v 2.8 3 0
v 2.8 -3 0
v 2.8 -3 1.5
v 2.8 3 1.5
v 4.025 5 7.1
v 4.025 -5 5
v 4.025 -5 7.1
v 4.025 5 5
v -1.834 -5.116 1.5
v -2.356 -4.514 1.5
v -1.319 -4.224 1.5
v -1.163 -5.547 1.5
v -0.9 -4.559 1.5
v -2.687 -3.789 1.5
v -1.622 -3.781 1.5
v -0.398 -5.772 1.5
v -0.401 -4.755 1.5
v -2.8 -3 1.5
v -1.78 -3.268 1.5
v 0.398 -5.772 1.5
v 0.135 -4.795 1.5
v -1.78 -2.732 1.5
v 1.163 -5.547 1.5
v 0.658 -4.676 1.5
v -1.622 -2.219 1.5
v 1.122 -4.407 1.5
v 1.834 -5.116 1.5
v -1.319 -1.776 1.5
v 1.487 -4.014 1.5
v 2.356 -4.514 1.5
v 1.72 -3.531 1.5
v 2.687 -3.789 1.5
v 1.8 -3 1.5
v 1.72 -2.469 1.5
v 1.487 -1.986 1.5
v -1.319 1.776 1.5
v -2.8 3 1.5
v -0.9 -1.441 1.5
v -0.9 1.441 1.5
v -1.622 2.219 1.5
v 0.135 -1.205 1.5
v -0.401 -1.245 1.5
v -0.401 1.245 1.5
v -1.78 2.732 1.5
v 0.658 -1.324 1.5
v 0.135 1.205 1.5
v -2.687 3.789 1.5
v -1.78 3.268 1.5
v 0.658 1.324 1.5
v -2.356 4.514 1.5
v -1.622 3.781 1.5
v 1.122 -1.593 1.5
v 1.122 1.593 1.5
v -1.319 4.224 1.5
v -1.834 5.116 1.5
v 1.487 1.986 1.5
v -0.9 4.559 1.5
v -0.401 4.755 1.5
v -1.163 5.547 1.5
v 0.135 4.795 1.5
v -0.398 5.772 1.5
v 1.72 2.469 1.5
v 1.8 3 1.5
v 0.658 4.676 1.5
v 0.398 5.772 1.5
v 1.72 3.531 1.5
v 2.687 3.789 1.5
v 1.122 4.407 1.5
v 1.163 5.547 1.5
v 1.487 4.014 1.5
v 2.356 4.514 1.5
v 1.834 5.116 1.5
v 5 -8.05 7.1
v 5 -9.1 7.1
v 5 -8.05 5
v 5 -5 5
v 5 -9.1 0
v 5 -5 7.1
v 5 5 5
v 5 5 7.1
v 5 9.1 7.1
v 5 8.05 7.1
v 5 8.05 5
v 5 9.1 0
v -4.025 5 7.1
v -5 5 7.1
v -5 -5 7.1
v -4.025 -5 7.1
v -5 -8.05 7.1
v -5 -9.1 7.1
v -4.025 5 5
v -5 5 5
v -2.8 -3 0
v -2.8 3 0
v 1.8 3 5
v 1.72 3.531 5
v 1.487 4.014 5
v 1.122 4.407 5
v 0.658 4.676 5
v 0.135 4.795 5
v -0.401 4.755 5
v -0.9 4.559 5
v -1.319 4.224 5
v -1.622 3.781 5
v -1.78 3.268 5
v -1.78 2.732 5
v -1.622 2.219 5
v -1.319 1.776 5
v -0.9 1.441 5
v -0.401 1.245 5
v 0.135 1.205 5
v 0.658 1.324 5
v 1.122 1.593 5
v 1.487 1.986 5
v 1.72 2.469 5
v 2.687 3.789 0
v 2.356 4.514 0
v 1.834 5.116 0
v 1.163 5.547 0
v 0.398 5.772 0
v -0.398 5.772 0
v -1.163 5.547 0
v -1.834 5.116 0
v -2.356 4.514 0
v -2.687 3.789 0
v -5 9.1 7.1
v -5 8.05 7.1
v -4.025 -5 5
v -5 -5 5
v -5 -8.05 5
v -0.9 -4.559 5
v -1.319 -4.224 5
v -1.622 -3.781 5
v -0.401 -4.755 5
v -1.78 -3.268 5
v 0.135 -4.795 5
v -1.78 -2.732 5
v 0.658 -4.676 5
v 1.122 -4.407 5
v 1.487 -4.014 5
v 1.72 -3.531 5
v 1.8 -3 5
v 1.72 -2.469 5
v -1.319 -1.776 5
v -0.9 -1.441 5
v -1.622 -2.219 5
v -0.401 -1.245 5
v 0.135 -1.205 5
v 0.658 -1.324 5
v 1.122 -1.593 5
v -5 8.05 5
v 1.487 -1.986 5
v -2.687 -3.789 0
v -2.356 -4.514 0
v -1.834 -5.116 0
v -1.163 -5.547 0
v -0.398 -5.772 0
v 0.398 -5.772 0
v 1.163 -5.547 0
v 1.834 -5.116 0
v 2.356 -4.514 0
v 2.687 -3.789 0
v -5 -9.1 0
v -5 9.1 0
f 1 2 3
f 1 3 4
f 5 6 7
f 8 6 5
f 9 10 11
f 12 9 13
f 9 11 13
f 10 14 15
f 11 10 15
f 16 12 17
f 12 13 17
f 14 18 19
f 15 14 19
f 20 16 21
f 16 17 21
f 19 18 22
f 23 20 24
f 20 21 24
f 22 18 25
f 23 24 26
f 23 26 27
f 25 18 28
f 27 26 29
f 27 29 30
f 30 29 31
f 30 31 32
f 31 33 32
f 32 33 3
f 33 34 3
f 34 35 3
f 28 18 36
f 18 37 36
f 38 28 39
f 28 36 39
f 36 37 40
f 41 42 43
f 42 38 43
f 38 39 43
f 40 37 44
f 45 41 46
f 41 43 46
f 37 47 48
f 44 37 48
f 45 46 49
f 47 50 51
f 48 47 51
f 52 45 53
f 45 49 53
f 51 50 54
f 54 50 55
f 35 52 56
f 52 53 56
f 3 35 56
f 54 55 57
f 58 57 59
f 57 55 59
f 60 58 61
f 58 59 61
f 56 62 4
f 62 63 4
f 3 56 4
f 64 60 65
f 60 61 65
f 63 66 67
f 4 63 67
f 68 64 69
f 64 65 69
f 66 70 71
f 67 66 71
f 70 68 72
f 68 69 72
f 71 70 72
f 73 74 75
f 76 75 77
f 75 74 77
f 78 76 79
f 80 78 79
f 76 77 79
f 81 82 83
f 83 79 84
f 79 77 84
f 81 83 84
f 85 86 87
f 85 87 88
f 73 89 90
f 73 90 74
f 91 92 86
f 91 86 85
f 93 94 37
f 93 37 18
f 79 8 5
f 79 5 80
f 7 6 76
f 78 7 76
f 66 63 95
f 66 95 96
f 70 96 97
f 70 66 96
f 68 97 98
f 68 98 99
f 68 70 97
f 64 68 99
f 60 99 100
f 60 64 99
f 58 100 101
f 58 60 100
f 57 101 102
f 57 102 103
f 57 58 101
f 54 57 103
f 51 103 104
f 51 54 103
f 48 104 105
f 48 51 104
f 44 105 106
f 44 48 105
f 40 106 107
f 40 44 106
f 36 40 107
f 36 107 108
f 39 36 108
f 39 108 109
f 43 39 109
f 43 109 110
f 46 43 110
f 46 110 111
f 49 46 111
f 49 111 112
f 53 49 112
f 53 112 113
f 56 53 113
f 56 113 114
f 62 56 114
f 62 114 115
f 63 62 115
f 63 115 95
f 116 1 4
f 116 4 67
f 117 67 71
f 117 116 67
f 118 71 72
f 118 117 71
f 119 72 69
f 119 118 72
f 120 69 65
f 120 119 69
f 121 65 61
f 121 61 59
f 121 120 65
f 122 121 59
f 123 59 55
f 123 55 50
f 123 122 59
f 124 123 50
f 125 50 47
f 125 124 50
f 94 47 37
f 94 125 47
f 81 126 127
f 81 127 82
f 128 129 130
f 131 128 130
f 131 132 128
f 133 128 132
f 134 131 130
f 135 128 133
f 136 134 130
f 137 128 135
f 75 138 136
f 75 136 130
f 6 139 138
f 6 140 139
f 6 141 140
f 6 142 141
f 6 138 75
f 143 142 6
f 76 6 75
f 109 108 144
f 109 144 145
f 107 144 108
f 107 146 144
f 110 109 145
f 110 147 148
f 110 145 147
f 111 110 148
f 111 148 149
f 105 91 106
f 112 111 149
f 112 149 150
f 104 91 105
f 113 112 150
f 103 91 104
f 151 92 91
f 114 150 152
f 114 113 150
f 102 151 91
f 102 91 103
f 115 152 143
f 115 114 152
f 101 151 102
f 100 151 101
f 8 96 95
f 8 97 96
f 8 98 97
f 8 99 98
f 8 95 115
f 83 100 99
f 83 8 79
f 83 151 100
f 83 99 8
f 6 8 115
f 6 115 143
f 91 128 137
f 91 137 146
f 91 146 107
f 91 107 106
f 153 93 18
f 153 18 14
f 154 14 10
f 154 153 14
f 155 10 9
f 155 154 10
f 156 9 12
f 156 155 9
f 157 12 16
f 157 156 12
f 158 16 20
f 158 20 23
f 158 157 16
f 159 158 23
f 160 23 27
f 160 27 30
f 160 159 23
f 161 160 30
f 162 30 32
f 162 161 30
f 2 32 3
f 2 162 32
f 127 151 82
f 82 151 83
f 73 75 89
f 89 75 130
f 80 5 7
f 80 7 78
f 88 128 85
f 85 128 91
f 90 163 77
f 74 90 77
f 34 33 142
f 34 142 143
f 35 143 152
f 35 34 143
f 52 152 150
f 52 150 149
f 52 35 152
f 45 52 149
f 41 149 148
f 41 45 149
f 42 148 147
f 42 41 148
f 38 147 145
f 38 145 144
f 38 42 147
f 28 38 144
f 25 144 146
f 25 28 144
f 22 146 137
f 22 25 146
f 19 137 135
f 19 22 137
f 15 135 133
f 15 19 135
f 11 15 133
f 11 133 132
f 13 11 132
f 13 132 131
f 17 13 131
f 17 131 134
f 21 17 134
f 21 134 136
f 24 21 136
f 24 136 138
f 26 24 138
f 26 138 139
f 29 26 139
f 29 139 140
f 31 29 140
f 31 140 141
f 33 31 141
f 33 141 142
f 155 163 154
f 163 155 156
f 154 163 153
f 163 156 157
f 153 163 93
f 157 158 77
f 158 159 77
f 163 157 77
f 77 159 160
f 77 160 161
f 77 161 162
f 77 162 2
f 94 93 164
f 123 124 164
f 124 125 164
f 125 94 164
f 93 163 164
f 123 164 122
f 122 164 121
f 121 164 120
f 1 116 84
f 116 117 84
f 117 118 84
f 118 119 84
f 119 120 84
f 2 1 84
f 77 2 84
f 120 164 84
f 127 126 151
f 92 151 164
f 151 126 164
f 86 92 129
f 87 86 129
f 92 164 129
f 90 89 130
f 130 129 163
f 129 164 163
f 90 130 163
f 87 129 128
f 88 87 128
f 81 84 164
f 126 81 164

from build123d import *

# Parameters (mm, degrees)
F0_W     = 0.975
F0_H     = 3.05
F0_H_2   = 10
F0_R     = 1.8
F1_DEPTH = 5
F2_DEPTH = 1.5
F3_DEPTH = 7.1


with BuildPart() as f1:
    # F0 (on Top) → F1 (new body)
    with BuildSketch(Plane.XY):
        Polygon((5, -9.1), (5, -8.05), (4.025, -8.05), (-4.025, -8.05), (-5, -8.05), (-5, -9.1), align=None)
        with Locations((4.5125, -6.525)):
            Rectangle(F0_W, F0_H)
        Polygon((4.025, 5), (4.025, 8.05), (-4.025, 8.05), (-4.025, 5), (-4.025, -5), (-4.025, -8.05), (4.025, -8.05), (4.025, -5), align=None)
        with BuildLine():
            ThreePointArc((-2.8, 3), (0, 5.8), (2.8, 3))
            Line((2.8, 3), (2.8, 0))
            Line((2.8, 0), (2.8, -3))
            ThreePointArc((2.8, -3), (0, -5.8), (-2.8, -3))
            Line((-2.8, -3), (-2.8, 0))
            Line((-2.8, 0), (-2.8, 3))
        make_face(mode=Mode.SUBTRACT)
        with Locations((-4.5125, -6.525)):
            Rectangle(F0_W, F0_H)
        with Locations((-4.5125, 0)):
            Rectangle(F0_W, F0_H_2)
        with Locations((4.5125, 0)):
            Rectangle(F0_W, F0_H_2)
        with Locations((4.5125, 6.525)):
            Rectangle(F0_W, F0_H)
        Polygon((5, 8.05), (5, 9.1), (-5, 9.1), (-5, 8.05), (-4.025, 8.05), (4.025, 8.05), align=None)
        with BuildLine():
            Line((2.8, 0), (2.8, 3))
            ThreePointArc((2.8, 3), (0, 5.8), (-2.8, 3))
            Line((-2.8, 3), (-2.8, 0))
            Line((-2.8, 0), (-2.8, -3))
            ThreePointArc((-2.8, -3), (0, -5.8), (2.8, -3))
            Line((2.8, -3), (2.8, 0))
        make_face()
        with Locations((0, -3)):
            Circle(F0_R, mode=Mode.SUBTRACT)
        with Locations((0, 3)):
            Circle(F0_R, mode=Mode.SUBTRACT)
        with Locations((-4.5125, 6.525)):
            Rectangle(F0_W, F0_H)
    extrude(amount=F1_DEPTH)

    # F0 (on Top) → F2 (cut)
    with BuildSketch(Plane.XY):
        with BuildLine():
            Line((2.8, 0), (2.8, 3))
            ThreePointArc((2.8, 3), (0, 5.8), (-2.8, 3))
            Line((-2.8, 3), (-2.8, 0))
            Line((-2.8, 0), (-2.8, -3))
            ThreePointArc((-2.8, -3), (0, -5.8), (2.8, -3))
            Line((2.8, -3), (2.8, 0))
        make_face()
        with Locations((0, -3)):
            Circle(F0_R, mode=Mode.SUBTRACT)
        with Locations((0, 3)):
            Circle(F0_R, mode=Mode.SUBTRACT)
    extrude(amount=F2_DEPTH, mode=Mode.SUBTRACT)

    # F0 (on Top) → F3 (join)
    with BuildSketch(Plane.XY):
        with Locations((-4.5125, 0)):
            Rectangle(F0_W, F0_H_2)
        Polygon((5, -9.1), (5, -8.05), (4.025, -8.05), (-4.025, -8.05), (-5, -8.05), (-5, -9.1), align=None)
        with Locations((4.5125, 0)):
            Rectangle(F0_W, F0_H_2)
        Polygon((5, 8.05), (5, 9.1), (-5, 9.1), (-5, 8.05), (-4.025, 8.05), (4.025, 8.05), align=None)
    extrude(amount=F3_DEPTH)


solid = f1.part
